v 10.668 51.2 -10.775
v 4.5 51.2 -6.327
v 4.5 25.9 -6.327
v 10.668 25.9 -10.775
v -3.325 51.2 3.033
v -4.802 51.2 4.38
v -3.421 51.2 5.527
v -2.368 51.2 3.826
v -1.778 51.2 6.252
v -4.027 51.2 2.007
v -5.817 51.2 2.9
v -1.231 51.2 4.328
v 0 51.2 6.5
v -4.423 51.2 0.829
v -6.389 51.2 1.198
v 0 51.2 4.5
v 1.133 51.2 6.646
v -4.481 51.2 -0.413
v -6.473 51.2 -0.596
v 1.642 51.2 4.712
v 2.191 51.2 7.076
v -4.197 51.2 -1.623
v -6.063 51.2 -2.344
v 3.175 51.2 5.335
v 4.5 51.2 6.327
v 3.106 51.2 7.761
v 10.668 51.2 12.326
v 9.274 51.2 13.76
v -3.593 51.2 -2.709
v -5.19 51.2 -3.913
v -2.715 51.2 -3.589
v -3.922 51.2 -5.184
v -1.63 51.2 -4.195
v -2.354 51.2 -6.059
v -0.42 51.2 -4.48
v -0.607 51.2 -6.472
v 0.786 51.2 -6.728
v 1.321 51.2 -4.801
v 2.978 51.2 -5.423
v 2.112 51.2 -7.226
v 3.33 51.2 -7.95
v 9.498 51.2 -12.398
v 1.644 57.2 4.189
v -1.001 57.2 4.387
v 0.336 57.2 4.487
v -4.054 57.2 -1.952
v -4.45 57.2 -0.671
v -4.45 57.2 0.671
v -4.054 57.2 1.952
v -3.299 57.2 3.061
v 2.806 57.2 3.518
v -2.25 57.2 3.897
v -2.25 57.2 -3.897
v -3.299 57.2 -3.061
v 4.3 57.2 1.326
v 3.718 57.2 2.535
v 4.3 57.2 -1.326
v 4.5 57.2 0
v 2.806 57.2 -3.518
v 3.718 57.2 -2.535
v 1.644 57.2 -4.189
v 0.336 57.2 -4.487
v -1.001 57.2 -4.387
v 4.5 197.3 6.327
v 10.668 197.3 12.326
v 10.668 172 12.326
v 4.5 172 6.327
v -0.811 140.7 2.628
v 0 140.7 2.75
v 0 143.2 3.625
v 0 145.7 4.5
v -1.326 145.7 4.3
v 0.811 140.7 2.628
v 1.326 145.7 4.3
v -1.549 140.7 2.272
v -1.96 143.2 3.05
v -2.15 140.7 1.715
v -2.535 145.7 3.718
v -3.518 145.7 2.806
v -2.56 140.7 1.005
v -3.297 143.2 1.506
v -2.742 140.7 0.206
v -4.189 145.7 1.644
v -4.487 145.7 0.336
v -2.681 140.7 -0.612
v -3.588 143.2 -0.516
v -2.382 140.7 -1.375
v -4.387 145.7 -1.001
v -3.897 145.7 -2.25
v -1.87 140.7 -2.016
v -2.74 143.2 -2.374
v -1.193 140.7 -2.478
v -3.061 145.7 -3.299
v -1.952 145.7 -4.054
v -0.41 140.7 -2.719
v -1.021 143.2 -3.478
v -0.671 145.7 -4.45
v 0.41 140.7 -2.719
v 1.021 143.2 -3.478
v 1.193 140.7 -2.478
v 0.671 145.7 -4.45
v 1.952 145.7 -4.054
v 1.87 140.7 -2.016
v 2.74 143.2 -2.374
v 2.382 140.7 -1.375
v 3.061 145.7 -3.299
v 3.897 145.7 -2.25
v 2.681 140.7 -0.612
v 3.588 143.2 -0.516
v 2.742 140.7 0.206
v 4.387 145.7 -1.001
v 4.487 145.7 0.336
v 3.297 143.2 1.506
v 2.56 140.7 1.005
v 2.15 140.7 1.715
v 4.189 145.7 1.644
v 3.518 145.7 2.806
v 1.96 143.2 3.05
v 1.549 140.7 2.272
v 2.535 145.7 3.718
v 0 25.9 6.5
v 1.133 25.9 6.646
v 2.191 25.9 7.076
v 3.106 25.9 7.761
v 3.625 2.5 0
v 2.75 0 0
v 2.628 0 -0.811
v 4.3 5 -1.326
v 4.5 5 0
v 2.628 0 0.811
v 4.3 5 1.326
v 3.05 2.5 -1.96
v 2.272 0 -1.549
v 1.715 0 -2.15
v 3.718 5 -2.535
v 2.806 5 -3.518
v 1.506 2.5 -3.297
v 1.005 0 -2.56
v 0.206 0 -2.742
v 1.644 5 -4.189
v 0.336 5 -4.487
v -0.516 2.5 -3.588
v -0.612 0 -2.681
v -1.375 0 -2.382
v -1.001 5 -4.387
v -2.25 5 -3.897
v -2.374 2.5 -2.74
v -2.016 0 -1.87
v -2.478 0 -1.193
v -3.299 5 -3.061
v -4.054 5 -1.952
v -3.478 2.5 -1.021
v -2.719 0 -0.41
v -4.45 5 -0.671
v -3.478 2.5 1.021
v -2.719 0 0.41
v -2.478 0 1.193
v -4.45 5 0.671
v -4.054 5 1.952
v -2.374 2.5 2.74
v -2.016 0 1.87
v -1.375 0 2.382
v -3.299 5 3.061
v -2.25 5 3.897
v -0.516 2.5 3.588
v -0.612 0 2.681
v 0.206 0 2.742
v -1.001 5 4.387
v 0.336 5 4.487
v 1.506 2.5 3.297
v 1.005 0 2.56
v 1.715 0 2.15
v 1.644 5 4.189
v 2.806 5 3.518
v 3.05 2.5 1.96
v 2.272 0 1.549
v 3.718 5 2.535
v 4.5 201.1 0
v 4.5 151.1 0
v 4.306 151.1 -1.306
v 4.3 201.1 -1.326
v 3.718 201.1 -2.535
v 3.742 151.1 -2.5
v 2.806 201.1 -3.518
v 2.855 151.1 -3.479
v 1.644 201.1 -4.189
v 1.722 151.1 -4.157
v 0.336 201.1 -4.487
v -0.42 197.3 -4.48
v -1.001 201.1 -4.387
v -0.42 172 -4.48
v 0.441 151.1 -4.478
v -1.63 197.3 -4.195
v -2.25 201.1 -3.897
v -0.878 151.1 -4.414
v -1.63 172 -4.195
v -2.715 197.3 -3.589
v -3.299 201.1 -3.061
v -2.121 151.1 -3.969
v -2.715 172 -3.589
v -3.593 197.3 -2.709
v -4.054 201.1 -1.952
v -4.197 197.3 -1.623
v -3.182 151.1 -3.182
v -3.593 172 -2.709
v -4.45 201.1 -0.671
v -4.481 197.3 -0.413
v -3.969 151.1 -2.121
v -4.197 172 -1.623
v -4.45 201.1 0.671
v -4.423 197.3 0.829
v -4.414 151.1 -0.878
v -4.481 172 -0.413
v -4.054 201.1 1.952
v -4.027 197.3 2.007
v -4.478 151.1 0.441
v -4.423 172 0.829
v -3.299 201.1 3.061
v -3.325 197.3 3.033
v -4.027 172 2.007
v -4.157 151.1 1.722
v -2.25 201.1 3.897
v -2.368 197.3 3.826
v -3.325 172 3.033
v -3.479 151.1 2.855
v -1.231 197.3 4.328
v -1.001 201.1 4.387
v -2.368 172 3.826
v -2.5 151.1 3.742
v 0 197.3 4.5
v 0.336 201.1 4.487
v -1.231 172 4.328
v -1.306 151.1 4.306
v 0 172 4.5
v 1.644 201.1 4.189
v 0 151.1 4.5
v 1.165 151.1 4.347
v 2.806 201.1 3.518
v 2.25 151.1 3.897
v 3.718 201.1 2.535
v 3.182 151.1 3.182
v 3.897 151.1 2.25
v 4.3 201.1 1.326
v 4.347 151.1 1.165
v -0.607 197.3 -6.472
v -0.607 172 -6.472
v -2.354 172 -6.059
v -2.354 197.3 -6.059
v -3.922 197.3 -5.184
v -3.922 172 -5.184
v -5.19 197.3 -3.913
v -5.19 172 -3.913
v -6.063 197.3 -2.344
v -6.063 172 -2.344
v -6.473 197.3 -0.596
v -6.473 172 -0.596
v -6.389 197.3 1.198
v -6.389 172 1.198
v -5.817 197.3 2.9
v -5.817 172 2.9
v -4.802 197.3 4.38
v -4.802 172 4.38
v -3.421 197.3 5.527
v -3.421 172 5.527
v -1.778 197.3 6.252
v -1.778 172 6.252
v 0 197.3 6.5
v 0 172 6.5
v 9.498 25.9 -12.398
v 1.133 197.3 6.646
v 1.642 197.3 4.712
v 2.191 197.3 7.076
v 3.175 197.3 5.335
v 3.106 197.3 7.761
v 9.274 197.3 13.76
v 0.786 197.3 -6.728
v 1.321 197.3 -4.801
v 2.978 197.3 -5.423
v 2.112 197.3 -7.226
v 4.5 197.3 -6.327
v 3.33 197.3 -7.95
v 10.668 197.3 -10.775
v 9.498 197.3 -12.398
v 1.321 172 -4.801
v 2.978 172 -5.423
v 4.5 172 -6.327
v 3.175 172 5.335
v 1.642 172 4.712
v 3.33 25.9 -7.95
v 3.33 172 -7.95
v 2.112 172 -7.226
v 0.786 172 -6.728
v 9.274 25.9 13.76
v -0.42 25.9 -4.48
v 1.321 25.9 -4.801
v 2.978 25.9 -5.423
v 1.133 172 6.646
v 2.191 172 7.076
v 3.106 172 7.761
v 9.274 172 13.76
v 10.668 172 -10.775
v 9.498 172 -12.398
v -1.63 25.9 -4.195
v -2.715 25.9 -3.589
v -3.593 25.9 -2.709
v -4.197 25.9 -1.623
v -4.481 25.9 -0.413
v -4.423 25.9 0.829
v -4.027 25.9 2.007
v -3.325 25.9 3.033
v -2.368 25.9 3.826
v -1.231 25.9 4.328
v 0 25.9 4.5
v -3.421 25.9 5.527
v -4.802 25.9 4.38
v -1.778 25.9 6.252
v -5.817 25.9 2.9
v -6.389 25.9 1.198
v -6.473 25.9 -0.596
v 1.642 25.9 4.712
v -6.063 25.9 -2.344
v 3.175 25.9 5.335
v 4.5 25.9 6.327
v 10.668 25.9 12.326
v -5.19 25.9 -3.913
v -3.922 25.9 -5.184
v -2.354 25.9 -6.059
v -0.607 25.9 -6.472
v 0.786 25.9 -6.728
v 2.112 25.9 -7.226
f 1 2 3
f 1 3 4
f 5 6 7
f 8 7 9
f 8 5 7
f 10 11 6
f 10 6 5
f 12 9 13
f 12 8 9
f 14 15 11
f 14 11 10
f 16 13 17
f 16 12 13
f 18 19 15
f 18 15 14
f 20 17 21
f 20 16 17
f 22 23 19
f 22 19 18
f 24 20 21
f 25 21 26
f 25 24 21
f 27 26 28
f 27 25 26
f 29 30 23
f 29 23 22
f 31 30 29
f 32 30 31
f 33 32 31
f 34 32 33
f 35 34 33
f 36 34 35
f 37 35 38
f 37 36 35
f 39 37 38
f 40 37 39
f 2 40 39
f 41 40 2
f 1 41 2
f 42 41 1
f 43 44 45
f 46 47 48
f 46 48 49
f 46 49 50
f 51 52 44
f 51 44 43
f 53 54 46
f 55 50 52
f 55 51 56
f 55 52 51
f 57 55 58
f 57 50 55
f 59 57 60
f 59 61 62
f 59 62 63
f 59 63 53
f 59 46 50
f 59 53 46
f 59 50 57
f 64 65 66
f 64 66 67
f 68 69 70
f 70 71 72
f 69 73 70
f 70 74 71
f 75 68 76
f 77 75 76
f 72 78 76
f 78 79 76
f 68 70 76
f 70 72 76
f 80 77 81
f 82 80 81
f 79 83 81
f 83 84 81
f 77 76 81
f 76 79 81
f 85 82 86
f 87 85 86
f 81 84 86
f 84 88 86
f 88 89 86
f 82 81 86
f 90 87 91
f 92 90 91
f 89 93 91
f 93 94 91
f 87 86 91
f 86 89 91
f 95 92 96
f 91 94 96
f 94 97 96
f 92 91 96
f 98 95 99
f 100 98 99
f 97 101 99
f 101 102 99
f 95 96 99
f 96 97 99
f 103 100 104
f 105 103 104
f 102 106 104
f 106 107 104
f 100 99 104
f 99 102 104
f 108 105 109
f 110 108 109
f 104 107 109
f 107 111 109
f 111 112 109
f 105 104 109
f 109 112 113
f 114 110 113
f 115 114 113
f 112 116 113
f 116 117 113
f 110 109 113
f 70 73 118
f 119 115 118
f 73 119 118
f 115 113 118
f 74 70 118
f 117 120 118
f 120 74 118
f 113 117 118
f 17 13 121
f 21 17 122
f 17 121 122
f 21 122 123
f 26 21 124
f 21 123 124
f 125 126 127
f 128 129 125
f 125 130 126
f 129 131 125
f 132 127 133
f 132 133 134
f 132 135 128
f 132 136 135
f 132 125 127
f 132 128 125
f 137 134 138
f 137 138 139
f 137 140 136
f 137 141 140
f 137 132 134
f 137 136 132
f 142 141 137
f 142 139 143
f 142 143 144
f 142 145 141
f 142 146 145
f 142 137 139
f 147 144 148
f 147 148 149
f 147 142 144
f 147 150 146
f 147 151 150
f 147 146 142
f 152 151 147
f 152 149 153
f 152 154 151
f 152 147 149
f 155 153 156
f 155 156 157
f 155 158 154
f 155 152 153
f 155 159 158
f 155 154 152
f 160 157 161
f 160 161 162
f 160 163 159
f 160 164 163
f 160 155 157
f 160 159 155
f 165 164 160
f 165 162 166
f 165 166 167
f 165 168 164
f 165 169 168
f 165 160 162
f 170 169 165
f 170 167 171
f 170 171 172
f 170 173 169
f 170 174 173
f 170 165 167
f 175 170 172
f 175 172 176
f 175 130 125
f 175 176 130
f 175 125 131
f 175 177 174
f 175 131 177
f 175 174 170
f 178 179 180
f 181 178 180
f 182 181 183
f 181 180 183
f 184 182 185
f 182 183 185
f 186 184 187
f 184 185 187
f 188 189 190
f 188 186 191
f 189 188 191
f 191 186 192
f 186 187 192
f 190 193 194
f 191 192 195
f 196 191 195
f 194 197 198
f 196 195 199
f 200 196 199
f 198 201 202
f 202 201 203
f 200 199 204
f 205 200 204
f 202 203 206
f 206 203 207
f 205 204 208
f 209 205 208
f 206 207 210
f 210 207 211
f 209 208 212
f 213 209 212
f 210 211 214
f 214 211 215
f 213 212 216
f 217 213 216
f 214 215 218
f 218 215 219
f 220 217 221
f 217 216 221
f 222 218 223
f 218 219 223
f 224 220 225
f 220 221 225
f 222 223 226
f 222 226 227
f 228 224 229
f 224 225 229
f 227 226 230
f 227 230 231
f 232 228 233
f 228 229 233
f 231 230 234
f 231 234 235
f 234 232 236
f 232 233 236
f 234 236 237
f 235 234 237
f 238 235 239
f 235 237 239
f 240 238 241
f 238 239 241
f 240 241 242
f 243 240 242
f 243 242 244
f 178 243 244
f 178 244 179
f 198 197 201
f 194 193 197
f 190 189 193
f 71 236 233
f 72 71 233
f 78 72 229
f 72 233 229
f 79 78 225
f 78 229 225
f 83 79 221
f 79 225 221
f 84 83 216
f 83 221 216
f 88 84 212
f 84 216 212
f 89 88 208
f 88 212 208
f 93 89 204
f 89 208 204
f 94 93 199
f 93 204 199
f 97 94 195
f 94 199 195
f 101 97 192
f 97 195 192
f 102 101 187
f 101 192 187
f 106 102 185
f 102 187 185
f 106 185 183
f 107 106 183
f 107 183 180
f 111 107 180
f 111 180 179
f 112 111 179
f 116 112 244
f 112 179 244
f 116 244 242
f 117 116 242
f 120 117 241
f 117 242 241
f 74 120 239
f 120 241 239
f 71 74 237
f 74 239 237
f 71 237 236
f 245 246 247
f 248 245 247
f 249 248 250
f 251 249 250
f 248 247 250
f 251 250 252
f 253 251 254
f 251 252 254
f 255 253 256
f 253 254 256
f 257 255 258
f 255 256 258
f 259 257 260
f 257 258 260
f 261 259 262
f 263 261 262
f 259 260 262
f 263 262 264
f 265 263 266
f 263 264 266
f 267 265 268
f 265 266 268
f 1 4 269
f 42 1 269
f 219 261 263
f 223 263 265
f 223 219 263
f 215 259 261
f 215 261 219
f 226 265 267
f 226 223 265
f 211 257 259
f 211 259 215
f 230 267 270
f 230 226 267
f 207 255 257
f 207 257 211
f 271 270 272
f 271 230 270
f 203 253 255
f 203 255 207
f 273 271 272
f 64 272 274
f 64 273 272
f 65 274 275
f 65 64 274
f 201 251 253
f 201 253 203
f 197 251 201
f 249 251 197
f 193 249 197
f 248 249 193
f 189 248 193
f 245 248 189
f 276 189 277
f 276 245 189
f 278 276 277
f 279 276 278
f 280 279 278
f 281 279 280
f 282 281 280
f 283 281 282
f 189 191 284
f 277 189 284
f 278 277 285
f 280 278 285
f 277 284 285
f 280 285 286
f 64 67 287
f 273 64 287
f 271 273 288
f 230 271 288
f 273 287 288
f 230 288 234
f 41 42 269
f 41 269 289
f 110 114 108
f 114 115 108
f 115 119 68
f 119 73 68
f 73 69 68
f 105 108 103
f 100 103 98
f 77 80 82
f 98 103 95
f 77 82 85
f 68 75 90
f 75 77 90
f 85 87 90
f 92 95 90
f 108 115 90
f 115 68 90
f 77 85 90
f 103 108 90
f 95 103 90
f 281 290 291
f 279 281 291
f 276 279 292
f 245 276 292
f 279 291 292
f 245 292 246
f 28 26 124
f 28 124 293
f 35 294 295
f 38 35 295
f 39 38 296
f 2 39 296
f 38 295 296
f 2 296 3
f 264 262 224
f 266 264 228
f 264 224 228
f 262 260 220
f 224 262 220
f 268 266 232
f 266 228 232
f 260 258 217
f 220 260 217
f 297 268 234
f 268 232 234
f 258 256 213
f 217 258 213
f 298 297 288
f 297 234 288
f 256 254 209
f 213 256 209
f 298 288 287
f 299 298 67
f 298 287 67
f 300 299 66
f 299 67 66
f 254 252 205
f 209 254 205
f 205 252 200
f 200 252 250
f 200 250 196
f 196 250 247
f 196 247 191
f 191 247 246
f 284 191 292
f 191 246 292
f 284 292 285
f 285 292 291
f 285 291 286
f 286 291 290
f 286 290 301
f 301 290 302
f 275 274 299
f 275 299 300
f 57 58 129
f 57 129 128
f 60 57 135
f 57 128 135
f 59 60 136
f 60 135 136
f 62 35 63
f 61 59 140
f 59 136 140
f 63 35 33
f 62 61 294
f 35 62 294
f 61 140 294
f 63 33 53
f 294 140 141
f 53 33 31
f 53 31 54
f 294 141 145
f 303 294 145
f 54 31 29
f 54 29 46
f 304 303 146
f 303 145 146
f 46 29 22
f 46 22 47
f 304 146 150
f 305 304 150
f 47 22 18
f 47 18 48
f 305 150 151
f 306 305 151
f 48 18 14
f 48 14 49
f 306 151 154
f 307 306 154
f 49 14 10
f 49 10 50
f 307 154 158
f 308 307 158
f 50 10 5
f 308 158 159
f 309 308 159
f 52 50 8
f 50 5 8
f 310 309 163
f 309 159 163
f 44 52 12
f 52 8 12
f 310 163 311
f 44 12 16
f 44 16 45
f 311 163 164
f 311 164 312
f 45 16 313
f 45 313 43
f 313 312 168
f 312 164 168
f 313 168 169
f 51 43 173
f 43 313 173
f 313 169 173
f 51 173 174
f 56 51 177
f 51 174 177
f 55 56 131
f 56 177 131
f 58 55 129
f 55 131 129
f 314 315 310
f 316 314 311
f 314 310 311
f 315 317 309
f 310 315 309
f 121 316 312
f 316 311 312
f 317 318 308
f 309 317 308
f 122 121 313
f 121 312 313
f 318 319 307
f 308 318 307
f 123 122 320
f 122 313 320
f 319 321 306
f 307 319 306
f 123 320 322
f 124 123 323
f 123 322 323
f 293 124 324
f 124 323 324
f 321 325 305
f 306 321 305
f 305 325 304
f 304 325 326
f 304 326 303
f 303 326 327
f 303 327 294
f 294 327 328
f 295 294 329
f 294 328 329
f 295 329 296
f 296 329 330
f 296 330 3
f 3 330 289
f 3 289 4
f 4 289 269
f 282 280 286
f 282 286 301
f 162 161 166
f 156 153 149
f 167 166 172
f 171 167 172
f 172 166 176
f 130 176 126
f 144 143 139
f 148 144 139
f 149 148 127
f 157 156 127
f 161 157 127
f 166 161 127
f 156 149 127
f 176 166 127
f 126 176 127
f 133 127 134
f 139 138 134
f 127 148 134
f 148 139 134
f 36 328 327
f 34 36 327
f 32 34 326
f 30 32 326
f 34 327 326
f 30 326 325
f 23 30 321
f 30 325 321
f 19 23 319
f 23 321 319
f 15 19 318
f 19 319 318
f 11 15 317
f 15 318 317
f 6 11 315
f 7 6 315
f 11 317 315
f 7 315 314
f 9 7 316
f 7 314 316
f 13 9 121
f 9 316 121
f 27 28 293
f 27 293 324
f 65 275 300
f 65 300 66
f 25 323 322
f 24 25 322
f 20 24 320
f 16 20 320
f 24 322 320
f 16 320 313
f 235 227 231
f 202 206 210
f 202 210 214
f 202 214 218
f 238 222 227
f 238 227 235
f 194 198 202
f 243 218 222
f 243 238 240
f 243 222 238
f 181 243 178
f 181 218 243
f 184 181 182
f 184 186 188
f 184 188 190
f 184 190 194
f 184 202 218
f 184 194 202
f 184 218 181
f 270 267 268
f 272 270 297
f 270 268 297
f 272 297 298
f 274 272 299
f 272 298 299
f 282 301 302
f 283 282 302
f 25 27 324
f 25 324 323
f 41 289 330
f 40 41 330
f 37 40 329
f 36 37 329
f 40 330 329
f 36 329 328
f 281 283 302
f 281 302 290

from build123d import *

# Parameters (mm, degrees)
SKETCH1_R           = 4.5
BOSS_EXTRUDE1_DEPTH = 55
CHAMFER1_SIZE       = 1.75
CHAMFER1_SIZE2      = 5
BOSS_EXTRUDE2_DEPTH = 25.3
LPATTERN1_COUNT     = 2
LPATTERN1_PITCH     = 146.1
SKETCH4_R           = 4.5
BOSS_EXTRUDE3_DEPTH = 2.2


with BuildPart() as part:
    # Sketch1 → Boss-Extrude1 (new body)
    with BuildSketch(Plane(origin=(0, 0, 0), x_dir=(1, 0, 0), z_dir=(0, 1, 0))):
        Circle(SKETCH1_R)
    extrude(amount=BOSS_EXTRUDE1_DEPTH)

    # Chamfer1
    chamfer1_edges = [part.edges().sort_by_distance(p)[0] for p in [
        (-4.5, 0, 0),
    ]]
    chamfer1_side = [part.faces().sort_by_distance(p)[0] for p in [
        (0, 0, 0),
    ]]
    chamfer(chamfer1_edges, length=CHAMFER1_SIZE, length2=CHAMFER1_SIZE2, reference=chamfer1_side[0])

    # Sketch2 → Boss-Extrude2 (add)
    with BuildSketch(Plane(origin=(0, 25.9, 0), x_dir=(-1, 0, 0), z_dir=(0, -1, 0))):
        with BuildLine():
            Line((-10.667941217, -12.326088827), (-4.5, -6.327398099))
            ThreePointArc((-4.5, -6.327398099), (-2.428445172, -4.974274671), (0, -4.5))
            ThreePointArc((0, -4.5), (4.495084869, -0.210266542), (0.420073756, 4.480350214))
            ThreePointArc((0.420073756, 4.480350214), (-2.163354244, 5.075191059), (-4.5, 6.327398099))
            Line((-4.5, 6.327398099), (-10.667941217, 10.775365439))
            Line((-10.667941217, 10.775365439), (-9.498111019, 12.397554486))
            Line((-9.498111019, 12.397554486), (-3.330169801, 7.949587147))
            ThreePointArc((-3.330169801, 7.949587147), (-1.460433366, 6.947596528), (0.606773203, 6.471616976))
            ThreePointArc((0.606773203, 6.471616976), (6.492900367, -0.303718338), (0, -6.5))
            ThreePointArc((0, -6.5), (-1.67594801, -6.827312183), (-3.105594531, -7.761146121))
            Line((-3.105594531, -7.761146121), (-9.273535749, -13.759836849))
            Line((-9.273535749, -13.759836849), (-10.667941217, -12.326088827))
        make_face()
    extrude(amount=-BOSS_EXTRUDE2_DEPTH)


with BuildPart() as lpattern1_1:
    # LPattern1: pattern copy
    add(part.part.moved(Location(Vector(0, 1, 0) * (1 * LPATTERN1_PITCH))))

    # Sketch3 → Revolve3 (revolve)
    with BuildSketch(Plane(origin=(0, 0, 0), x_dir=(0, 0, -1), z_dir=(1, 0, 0))):
        Polygon((0, 146.1), (0, 140.7), (-2.75, 140.7), (-4.5, 145.7), (-4.5, 151.1), (-2.75, 146.1), align=None)
    revolve(axis=Axis((0, 146.1, 0), (0, -1, 0)))


with BuildPart() as part_1:
    add(part.part)

    # Sketch4 → Boss-Extrude3 (add)
    with BuildSketch(Plane(origin=(0, 55, 0), x_dir=(1, 0, 0), z_dir=(0, 1, 0))):
        Circle(SKETCH4_R)
    extrude(amount=BOSS_EXTRUDE3_DEPTH)


solid = Compound([lpattern1_1.part, part_1.part])
